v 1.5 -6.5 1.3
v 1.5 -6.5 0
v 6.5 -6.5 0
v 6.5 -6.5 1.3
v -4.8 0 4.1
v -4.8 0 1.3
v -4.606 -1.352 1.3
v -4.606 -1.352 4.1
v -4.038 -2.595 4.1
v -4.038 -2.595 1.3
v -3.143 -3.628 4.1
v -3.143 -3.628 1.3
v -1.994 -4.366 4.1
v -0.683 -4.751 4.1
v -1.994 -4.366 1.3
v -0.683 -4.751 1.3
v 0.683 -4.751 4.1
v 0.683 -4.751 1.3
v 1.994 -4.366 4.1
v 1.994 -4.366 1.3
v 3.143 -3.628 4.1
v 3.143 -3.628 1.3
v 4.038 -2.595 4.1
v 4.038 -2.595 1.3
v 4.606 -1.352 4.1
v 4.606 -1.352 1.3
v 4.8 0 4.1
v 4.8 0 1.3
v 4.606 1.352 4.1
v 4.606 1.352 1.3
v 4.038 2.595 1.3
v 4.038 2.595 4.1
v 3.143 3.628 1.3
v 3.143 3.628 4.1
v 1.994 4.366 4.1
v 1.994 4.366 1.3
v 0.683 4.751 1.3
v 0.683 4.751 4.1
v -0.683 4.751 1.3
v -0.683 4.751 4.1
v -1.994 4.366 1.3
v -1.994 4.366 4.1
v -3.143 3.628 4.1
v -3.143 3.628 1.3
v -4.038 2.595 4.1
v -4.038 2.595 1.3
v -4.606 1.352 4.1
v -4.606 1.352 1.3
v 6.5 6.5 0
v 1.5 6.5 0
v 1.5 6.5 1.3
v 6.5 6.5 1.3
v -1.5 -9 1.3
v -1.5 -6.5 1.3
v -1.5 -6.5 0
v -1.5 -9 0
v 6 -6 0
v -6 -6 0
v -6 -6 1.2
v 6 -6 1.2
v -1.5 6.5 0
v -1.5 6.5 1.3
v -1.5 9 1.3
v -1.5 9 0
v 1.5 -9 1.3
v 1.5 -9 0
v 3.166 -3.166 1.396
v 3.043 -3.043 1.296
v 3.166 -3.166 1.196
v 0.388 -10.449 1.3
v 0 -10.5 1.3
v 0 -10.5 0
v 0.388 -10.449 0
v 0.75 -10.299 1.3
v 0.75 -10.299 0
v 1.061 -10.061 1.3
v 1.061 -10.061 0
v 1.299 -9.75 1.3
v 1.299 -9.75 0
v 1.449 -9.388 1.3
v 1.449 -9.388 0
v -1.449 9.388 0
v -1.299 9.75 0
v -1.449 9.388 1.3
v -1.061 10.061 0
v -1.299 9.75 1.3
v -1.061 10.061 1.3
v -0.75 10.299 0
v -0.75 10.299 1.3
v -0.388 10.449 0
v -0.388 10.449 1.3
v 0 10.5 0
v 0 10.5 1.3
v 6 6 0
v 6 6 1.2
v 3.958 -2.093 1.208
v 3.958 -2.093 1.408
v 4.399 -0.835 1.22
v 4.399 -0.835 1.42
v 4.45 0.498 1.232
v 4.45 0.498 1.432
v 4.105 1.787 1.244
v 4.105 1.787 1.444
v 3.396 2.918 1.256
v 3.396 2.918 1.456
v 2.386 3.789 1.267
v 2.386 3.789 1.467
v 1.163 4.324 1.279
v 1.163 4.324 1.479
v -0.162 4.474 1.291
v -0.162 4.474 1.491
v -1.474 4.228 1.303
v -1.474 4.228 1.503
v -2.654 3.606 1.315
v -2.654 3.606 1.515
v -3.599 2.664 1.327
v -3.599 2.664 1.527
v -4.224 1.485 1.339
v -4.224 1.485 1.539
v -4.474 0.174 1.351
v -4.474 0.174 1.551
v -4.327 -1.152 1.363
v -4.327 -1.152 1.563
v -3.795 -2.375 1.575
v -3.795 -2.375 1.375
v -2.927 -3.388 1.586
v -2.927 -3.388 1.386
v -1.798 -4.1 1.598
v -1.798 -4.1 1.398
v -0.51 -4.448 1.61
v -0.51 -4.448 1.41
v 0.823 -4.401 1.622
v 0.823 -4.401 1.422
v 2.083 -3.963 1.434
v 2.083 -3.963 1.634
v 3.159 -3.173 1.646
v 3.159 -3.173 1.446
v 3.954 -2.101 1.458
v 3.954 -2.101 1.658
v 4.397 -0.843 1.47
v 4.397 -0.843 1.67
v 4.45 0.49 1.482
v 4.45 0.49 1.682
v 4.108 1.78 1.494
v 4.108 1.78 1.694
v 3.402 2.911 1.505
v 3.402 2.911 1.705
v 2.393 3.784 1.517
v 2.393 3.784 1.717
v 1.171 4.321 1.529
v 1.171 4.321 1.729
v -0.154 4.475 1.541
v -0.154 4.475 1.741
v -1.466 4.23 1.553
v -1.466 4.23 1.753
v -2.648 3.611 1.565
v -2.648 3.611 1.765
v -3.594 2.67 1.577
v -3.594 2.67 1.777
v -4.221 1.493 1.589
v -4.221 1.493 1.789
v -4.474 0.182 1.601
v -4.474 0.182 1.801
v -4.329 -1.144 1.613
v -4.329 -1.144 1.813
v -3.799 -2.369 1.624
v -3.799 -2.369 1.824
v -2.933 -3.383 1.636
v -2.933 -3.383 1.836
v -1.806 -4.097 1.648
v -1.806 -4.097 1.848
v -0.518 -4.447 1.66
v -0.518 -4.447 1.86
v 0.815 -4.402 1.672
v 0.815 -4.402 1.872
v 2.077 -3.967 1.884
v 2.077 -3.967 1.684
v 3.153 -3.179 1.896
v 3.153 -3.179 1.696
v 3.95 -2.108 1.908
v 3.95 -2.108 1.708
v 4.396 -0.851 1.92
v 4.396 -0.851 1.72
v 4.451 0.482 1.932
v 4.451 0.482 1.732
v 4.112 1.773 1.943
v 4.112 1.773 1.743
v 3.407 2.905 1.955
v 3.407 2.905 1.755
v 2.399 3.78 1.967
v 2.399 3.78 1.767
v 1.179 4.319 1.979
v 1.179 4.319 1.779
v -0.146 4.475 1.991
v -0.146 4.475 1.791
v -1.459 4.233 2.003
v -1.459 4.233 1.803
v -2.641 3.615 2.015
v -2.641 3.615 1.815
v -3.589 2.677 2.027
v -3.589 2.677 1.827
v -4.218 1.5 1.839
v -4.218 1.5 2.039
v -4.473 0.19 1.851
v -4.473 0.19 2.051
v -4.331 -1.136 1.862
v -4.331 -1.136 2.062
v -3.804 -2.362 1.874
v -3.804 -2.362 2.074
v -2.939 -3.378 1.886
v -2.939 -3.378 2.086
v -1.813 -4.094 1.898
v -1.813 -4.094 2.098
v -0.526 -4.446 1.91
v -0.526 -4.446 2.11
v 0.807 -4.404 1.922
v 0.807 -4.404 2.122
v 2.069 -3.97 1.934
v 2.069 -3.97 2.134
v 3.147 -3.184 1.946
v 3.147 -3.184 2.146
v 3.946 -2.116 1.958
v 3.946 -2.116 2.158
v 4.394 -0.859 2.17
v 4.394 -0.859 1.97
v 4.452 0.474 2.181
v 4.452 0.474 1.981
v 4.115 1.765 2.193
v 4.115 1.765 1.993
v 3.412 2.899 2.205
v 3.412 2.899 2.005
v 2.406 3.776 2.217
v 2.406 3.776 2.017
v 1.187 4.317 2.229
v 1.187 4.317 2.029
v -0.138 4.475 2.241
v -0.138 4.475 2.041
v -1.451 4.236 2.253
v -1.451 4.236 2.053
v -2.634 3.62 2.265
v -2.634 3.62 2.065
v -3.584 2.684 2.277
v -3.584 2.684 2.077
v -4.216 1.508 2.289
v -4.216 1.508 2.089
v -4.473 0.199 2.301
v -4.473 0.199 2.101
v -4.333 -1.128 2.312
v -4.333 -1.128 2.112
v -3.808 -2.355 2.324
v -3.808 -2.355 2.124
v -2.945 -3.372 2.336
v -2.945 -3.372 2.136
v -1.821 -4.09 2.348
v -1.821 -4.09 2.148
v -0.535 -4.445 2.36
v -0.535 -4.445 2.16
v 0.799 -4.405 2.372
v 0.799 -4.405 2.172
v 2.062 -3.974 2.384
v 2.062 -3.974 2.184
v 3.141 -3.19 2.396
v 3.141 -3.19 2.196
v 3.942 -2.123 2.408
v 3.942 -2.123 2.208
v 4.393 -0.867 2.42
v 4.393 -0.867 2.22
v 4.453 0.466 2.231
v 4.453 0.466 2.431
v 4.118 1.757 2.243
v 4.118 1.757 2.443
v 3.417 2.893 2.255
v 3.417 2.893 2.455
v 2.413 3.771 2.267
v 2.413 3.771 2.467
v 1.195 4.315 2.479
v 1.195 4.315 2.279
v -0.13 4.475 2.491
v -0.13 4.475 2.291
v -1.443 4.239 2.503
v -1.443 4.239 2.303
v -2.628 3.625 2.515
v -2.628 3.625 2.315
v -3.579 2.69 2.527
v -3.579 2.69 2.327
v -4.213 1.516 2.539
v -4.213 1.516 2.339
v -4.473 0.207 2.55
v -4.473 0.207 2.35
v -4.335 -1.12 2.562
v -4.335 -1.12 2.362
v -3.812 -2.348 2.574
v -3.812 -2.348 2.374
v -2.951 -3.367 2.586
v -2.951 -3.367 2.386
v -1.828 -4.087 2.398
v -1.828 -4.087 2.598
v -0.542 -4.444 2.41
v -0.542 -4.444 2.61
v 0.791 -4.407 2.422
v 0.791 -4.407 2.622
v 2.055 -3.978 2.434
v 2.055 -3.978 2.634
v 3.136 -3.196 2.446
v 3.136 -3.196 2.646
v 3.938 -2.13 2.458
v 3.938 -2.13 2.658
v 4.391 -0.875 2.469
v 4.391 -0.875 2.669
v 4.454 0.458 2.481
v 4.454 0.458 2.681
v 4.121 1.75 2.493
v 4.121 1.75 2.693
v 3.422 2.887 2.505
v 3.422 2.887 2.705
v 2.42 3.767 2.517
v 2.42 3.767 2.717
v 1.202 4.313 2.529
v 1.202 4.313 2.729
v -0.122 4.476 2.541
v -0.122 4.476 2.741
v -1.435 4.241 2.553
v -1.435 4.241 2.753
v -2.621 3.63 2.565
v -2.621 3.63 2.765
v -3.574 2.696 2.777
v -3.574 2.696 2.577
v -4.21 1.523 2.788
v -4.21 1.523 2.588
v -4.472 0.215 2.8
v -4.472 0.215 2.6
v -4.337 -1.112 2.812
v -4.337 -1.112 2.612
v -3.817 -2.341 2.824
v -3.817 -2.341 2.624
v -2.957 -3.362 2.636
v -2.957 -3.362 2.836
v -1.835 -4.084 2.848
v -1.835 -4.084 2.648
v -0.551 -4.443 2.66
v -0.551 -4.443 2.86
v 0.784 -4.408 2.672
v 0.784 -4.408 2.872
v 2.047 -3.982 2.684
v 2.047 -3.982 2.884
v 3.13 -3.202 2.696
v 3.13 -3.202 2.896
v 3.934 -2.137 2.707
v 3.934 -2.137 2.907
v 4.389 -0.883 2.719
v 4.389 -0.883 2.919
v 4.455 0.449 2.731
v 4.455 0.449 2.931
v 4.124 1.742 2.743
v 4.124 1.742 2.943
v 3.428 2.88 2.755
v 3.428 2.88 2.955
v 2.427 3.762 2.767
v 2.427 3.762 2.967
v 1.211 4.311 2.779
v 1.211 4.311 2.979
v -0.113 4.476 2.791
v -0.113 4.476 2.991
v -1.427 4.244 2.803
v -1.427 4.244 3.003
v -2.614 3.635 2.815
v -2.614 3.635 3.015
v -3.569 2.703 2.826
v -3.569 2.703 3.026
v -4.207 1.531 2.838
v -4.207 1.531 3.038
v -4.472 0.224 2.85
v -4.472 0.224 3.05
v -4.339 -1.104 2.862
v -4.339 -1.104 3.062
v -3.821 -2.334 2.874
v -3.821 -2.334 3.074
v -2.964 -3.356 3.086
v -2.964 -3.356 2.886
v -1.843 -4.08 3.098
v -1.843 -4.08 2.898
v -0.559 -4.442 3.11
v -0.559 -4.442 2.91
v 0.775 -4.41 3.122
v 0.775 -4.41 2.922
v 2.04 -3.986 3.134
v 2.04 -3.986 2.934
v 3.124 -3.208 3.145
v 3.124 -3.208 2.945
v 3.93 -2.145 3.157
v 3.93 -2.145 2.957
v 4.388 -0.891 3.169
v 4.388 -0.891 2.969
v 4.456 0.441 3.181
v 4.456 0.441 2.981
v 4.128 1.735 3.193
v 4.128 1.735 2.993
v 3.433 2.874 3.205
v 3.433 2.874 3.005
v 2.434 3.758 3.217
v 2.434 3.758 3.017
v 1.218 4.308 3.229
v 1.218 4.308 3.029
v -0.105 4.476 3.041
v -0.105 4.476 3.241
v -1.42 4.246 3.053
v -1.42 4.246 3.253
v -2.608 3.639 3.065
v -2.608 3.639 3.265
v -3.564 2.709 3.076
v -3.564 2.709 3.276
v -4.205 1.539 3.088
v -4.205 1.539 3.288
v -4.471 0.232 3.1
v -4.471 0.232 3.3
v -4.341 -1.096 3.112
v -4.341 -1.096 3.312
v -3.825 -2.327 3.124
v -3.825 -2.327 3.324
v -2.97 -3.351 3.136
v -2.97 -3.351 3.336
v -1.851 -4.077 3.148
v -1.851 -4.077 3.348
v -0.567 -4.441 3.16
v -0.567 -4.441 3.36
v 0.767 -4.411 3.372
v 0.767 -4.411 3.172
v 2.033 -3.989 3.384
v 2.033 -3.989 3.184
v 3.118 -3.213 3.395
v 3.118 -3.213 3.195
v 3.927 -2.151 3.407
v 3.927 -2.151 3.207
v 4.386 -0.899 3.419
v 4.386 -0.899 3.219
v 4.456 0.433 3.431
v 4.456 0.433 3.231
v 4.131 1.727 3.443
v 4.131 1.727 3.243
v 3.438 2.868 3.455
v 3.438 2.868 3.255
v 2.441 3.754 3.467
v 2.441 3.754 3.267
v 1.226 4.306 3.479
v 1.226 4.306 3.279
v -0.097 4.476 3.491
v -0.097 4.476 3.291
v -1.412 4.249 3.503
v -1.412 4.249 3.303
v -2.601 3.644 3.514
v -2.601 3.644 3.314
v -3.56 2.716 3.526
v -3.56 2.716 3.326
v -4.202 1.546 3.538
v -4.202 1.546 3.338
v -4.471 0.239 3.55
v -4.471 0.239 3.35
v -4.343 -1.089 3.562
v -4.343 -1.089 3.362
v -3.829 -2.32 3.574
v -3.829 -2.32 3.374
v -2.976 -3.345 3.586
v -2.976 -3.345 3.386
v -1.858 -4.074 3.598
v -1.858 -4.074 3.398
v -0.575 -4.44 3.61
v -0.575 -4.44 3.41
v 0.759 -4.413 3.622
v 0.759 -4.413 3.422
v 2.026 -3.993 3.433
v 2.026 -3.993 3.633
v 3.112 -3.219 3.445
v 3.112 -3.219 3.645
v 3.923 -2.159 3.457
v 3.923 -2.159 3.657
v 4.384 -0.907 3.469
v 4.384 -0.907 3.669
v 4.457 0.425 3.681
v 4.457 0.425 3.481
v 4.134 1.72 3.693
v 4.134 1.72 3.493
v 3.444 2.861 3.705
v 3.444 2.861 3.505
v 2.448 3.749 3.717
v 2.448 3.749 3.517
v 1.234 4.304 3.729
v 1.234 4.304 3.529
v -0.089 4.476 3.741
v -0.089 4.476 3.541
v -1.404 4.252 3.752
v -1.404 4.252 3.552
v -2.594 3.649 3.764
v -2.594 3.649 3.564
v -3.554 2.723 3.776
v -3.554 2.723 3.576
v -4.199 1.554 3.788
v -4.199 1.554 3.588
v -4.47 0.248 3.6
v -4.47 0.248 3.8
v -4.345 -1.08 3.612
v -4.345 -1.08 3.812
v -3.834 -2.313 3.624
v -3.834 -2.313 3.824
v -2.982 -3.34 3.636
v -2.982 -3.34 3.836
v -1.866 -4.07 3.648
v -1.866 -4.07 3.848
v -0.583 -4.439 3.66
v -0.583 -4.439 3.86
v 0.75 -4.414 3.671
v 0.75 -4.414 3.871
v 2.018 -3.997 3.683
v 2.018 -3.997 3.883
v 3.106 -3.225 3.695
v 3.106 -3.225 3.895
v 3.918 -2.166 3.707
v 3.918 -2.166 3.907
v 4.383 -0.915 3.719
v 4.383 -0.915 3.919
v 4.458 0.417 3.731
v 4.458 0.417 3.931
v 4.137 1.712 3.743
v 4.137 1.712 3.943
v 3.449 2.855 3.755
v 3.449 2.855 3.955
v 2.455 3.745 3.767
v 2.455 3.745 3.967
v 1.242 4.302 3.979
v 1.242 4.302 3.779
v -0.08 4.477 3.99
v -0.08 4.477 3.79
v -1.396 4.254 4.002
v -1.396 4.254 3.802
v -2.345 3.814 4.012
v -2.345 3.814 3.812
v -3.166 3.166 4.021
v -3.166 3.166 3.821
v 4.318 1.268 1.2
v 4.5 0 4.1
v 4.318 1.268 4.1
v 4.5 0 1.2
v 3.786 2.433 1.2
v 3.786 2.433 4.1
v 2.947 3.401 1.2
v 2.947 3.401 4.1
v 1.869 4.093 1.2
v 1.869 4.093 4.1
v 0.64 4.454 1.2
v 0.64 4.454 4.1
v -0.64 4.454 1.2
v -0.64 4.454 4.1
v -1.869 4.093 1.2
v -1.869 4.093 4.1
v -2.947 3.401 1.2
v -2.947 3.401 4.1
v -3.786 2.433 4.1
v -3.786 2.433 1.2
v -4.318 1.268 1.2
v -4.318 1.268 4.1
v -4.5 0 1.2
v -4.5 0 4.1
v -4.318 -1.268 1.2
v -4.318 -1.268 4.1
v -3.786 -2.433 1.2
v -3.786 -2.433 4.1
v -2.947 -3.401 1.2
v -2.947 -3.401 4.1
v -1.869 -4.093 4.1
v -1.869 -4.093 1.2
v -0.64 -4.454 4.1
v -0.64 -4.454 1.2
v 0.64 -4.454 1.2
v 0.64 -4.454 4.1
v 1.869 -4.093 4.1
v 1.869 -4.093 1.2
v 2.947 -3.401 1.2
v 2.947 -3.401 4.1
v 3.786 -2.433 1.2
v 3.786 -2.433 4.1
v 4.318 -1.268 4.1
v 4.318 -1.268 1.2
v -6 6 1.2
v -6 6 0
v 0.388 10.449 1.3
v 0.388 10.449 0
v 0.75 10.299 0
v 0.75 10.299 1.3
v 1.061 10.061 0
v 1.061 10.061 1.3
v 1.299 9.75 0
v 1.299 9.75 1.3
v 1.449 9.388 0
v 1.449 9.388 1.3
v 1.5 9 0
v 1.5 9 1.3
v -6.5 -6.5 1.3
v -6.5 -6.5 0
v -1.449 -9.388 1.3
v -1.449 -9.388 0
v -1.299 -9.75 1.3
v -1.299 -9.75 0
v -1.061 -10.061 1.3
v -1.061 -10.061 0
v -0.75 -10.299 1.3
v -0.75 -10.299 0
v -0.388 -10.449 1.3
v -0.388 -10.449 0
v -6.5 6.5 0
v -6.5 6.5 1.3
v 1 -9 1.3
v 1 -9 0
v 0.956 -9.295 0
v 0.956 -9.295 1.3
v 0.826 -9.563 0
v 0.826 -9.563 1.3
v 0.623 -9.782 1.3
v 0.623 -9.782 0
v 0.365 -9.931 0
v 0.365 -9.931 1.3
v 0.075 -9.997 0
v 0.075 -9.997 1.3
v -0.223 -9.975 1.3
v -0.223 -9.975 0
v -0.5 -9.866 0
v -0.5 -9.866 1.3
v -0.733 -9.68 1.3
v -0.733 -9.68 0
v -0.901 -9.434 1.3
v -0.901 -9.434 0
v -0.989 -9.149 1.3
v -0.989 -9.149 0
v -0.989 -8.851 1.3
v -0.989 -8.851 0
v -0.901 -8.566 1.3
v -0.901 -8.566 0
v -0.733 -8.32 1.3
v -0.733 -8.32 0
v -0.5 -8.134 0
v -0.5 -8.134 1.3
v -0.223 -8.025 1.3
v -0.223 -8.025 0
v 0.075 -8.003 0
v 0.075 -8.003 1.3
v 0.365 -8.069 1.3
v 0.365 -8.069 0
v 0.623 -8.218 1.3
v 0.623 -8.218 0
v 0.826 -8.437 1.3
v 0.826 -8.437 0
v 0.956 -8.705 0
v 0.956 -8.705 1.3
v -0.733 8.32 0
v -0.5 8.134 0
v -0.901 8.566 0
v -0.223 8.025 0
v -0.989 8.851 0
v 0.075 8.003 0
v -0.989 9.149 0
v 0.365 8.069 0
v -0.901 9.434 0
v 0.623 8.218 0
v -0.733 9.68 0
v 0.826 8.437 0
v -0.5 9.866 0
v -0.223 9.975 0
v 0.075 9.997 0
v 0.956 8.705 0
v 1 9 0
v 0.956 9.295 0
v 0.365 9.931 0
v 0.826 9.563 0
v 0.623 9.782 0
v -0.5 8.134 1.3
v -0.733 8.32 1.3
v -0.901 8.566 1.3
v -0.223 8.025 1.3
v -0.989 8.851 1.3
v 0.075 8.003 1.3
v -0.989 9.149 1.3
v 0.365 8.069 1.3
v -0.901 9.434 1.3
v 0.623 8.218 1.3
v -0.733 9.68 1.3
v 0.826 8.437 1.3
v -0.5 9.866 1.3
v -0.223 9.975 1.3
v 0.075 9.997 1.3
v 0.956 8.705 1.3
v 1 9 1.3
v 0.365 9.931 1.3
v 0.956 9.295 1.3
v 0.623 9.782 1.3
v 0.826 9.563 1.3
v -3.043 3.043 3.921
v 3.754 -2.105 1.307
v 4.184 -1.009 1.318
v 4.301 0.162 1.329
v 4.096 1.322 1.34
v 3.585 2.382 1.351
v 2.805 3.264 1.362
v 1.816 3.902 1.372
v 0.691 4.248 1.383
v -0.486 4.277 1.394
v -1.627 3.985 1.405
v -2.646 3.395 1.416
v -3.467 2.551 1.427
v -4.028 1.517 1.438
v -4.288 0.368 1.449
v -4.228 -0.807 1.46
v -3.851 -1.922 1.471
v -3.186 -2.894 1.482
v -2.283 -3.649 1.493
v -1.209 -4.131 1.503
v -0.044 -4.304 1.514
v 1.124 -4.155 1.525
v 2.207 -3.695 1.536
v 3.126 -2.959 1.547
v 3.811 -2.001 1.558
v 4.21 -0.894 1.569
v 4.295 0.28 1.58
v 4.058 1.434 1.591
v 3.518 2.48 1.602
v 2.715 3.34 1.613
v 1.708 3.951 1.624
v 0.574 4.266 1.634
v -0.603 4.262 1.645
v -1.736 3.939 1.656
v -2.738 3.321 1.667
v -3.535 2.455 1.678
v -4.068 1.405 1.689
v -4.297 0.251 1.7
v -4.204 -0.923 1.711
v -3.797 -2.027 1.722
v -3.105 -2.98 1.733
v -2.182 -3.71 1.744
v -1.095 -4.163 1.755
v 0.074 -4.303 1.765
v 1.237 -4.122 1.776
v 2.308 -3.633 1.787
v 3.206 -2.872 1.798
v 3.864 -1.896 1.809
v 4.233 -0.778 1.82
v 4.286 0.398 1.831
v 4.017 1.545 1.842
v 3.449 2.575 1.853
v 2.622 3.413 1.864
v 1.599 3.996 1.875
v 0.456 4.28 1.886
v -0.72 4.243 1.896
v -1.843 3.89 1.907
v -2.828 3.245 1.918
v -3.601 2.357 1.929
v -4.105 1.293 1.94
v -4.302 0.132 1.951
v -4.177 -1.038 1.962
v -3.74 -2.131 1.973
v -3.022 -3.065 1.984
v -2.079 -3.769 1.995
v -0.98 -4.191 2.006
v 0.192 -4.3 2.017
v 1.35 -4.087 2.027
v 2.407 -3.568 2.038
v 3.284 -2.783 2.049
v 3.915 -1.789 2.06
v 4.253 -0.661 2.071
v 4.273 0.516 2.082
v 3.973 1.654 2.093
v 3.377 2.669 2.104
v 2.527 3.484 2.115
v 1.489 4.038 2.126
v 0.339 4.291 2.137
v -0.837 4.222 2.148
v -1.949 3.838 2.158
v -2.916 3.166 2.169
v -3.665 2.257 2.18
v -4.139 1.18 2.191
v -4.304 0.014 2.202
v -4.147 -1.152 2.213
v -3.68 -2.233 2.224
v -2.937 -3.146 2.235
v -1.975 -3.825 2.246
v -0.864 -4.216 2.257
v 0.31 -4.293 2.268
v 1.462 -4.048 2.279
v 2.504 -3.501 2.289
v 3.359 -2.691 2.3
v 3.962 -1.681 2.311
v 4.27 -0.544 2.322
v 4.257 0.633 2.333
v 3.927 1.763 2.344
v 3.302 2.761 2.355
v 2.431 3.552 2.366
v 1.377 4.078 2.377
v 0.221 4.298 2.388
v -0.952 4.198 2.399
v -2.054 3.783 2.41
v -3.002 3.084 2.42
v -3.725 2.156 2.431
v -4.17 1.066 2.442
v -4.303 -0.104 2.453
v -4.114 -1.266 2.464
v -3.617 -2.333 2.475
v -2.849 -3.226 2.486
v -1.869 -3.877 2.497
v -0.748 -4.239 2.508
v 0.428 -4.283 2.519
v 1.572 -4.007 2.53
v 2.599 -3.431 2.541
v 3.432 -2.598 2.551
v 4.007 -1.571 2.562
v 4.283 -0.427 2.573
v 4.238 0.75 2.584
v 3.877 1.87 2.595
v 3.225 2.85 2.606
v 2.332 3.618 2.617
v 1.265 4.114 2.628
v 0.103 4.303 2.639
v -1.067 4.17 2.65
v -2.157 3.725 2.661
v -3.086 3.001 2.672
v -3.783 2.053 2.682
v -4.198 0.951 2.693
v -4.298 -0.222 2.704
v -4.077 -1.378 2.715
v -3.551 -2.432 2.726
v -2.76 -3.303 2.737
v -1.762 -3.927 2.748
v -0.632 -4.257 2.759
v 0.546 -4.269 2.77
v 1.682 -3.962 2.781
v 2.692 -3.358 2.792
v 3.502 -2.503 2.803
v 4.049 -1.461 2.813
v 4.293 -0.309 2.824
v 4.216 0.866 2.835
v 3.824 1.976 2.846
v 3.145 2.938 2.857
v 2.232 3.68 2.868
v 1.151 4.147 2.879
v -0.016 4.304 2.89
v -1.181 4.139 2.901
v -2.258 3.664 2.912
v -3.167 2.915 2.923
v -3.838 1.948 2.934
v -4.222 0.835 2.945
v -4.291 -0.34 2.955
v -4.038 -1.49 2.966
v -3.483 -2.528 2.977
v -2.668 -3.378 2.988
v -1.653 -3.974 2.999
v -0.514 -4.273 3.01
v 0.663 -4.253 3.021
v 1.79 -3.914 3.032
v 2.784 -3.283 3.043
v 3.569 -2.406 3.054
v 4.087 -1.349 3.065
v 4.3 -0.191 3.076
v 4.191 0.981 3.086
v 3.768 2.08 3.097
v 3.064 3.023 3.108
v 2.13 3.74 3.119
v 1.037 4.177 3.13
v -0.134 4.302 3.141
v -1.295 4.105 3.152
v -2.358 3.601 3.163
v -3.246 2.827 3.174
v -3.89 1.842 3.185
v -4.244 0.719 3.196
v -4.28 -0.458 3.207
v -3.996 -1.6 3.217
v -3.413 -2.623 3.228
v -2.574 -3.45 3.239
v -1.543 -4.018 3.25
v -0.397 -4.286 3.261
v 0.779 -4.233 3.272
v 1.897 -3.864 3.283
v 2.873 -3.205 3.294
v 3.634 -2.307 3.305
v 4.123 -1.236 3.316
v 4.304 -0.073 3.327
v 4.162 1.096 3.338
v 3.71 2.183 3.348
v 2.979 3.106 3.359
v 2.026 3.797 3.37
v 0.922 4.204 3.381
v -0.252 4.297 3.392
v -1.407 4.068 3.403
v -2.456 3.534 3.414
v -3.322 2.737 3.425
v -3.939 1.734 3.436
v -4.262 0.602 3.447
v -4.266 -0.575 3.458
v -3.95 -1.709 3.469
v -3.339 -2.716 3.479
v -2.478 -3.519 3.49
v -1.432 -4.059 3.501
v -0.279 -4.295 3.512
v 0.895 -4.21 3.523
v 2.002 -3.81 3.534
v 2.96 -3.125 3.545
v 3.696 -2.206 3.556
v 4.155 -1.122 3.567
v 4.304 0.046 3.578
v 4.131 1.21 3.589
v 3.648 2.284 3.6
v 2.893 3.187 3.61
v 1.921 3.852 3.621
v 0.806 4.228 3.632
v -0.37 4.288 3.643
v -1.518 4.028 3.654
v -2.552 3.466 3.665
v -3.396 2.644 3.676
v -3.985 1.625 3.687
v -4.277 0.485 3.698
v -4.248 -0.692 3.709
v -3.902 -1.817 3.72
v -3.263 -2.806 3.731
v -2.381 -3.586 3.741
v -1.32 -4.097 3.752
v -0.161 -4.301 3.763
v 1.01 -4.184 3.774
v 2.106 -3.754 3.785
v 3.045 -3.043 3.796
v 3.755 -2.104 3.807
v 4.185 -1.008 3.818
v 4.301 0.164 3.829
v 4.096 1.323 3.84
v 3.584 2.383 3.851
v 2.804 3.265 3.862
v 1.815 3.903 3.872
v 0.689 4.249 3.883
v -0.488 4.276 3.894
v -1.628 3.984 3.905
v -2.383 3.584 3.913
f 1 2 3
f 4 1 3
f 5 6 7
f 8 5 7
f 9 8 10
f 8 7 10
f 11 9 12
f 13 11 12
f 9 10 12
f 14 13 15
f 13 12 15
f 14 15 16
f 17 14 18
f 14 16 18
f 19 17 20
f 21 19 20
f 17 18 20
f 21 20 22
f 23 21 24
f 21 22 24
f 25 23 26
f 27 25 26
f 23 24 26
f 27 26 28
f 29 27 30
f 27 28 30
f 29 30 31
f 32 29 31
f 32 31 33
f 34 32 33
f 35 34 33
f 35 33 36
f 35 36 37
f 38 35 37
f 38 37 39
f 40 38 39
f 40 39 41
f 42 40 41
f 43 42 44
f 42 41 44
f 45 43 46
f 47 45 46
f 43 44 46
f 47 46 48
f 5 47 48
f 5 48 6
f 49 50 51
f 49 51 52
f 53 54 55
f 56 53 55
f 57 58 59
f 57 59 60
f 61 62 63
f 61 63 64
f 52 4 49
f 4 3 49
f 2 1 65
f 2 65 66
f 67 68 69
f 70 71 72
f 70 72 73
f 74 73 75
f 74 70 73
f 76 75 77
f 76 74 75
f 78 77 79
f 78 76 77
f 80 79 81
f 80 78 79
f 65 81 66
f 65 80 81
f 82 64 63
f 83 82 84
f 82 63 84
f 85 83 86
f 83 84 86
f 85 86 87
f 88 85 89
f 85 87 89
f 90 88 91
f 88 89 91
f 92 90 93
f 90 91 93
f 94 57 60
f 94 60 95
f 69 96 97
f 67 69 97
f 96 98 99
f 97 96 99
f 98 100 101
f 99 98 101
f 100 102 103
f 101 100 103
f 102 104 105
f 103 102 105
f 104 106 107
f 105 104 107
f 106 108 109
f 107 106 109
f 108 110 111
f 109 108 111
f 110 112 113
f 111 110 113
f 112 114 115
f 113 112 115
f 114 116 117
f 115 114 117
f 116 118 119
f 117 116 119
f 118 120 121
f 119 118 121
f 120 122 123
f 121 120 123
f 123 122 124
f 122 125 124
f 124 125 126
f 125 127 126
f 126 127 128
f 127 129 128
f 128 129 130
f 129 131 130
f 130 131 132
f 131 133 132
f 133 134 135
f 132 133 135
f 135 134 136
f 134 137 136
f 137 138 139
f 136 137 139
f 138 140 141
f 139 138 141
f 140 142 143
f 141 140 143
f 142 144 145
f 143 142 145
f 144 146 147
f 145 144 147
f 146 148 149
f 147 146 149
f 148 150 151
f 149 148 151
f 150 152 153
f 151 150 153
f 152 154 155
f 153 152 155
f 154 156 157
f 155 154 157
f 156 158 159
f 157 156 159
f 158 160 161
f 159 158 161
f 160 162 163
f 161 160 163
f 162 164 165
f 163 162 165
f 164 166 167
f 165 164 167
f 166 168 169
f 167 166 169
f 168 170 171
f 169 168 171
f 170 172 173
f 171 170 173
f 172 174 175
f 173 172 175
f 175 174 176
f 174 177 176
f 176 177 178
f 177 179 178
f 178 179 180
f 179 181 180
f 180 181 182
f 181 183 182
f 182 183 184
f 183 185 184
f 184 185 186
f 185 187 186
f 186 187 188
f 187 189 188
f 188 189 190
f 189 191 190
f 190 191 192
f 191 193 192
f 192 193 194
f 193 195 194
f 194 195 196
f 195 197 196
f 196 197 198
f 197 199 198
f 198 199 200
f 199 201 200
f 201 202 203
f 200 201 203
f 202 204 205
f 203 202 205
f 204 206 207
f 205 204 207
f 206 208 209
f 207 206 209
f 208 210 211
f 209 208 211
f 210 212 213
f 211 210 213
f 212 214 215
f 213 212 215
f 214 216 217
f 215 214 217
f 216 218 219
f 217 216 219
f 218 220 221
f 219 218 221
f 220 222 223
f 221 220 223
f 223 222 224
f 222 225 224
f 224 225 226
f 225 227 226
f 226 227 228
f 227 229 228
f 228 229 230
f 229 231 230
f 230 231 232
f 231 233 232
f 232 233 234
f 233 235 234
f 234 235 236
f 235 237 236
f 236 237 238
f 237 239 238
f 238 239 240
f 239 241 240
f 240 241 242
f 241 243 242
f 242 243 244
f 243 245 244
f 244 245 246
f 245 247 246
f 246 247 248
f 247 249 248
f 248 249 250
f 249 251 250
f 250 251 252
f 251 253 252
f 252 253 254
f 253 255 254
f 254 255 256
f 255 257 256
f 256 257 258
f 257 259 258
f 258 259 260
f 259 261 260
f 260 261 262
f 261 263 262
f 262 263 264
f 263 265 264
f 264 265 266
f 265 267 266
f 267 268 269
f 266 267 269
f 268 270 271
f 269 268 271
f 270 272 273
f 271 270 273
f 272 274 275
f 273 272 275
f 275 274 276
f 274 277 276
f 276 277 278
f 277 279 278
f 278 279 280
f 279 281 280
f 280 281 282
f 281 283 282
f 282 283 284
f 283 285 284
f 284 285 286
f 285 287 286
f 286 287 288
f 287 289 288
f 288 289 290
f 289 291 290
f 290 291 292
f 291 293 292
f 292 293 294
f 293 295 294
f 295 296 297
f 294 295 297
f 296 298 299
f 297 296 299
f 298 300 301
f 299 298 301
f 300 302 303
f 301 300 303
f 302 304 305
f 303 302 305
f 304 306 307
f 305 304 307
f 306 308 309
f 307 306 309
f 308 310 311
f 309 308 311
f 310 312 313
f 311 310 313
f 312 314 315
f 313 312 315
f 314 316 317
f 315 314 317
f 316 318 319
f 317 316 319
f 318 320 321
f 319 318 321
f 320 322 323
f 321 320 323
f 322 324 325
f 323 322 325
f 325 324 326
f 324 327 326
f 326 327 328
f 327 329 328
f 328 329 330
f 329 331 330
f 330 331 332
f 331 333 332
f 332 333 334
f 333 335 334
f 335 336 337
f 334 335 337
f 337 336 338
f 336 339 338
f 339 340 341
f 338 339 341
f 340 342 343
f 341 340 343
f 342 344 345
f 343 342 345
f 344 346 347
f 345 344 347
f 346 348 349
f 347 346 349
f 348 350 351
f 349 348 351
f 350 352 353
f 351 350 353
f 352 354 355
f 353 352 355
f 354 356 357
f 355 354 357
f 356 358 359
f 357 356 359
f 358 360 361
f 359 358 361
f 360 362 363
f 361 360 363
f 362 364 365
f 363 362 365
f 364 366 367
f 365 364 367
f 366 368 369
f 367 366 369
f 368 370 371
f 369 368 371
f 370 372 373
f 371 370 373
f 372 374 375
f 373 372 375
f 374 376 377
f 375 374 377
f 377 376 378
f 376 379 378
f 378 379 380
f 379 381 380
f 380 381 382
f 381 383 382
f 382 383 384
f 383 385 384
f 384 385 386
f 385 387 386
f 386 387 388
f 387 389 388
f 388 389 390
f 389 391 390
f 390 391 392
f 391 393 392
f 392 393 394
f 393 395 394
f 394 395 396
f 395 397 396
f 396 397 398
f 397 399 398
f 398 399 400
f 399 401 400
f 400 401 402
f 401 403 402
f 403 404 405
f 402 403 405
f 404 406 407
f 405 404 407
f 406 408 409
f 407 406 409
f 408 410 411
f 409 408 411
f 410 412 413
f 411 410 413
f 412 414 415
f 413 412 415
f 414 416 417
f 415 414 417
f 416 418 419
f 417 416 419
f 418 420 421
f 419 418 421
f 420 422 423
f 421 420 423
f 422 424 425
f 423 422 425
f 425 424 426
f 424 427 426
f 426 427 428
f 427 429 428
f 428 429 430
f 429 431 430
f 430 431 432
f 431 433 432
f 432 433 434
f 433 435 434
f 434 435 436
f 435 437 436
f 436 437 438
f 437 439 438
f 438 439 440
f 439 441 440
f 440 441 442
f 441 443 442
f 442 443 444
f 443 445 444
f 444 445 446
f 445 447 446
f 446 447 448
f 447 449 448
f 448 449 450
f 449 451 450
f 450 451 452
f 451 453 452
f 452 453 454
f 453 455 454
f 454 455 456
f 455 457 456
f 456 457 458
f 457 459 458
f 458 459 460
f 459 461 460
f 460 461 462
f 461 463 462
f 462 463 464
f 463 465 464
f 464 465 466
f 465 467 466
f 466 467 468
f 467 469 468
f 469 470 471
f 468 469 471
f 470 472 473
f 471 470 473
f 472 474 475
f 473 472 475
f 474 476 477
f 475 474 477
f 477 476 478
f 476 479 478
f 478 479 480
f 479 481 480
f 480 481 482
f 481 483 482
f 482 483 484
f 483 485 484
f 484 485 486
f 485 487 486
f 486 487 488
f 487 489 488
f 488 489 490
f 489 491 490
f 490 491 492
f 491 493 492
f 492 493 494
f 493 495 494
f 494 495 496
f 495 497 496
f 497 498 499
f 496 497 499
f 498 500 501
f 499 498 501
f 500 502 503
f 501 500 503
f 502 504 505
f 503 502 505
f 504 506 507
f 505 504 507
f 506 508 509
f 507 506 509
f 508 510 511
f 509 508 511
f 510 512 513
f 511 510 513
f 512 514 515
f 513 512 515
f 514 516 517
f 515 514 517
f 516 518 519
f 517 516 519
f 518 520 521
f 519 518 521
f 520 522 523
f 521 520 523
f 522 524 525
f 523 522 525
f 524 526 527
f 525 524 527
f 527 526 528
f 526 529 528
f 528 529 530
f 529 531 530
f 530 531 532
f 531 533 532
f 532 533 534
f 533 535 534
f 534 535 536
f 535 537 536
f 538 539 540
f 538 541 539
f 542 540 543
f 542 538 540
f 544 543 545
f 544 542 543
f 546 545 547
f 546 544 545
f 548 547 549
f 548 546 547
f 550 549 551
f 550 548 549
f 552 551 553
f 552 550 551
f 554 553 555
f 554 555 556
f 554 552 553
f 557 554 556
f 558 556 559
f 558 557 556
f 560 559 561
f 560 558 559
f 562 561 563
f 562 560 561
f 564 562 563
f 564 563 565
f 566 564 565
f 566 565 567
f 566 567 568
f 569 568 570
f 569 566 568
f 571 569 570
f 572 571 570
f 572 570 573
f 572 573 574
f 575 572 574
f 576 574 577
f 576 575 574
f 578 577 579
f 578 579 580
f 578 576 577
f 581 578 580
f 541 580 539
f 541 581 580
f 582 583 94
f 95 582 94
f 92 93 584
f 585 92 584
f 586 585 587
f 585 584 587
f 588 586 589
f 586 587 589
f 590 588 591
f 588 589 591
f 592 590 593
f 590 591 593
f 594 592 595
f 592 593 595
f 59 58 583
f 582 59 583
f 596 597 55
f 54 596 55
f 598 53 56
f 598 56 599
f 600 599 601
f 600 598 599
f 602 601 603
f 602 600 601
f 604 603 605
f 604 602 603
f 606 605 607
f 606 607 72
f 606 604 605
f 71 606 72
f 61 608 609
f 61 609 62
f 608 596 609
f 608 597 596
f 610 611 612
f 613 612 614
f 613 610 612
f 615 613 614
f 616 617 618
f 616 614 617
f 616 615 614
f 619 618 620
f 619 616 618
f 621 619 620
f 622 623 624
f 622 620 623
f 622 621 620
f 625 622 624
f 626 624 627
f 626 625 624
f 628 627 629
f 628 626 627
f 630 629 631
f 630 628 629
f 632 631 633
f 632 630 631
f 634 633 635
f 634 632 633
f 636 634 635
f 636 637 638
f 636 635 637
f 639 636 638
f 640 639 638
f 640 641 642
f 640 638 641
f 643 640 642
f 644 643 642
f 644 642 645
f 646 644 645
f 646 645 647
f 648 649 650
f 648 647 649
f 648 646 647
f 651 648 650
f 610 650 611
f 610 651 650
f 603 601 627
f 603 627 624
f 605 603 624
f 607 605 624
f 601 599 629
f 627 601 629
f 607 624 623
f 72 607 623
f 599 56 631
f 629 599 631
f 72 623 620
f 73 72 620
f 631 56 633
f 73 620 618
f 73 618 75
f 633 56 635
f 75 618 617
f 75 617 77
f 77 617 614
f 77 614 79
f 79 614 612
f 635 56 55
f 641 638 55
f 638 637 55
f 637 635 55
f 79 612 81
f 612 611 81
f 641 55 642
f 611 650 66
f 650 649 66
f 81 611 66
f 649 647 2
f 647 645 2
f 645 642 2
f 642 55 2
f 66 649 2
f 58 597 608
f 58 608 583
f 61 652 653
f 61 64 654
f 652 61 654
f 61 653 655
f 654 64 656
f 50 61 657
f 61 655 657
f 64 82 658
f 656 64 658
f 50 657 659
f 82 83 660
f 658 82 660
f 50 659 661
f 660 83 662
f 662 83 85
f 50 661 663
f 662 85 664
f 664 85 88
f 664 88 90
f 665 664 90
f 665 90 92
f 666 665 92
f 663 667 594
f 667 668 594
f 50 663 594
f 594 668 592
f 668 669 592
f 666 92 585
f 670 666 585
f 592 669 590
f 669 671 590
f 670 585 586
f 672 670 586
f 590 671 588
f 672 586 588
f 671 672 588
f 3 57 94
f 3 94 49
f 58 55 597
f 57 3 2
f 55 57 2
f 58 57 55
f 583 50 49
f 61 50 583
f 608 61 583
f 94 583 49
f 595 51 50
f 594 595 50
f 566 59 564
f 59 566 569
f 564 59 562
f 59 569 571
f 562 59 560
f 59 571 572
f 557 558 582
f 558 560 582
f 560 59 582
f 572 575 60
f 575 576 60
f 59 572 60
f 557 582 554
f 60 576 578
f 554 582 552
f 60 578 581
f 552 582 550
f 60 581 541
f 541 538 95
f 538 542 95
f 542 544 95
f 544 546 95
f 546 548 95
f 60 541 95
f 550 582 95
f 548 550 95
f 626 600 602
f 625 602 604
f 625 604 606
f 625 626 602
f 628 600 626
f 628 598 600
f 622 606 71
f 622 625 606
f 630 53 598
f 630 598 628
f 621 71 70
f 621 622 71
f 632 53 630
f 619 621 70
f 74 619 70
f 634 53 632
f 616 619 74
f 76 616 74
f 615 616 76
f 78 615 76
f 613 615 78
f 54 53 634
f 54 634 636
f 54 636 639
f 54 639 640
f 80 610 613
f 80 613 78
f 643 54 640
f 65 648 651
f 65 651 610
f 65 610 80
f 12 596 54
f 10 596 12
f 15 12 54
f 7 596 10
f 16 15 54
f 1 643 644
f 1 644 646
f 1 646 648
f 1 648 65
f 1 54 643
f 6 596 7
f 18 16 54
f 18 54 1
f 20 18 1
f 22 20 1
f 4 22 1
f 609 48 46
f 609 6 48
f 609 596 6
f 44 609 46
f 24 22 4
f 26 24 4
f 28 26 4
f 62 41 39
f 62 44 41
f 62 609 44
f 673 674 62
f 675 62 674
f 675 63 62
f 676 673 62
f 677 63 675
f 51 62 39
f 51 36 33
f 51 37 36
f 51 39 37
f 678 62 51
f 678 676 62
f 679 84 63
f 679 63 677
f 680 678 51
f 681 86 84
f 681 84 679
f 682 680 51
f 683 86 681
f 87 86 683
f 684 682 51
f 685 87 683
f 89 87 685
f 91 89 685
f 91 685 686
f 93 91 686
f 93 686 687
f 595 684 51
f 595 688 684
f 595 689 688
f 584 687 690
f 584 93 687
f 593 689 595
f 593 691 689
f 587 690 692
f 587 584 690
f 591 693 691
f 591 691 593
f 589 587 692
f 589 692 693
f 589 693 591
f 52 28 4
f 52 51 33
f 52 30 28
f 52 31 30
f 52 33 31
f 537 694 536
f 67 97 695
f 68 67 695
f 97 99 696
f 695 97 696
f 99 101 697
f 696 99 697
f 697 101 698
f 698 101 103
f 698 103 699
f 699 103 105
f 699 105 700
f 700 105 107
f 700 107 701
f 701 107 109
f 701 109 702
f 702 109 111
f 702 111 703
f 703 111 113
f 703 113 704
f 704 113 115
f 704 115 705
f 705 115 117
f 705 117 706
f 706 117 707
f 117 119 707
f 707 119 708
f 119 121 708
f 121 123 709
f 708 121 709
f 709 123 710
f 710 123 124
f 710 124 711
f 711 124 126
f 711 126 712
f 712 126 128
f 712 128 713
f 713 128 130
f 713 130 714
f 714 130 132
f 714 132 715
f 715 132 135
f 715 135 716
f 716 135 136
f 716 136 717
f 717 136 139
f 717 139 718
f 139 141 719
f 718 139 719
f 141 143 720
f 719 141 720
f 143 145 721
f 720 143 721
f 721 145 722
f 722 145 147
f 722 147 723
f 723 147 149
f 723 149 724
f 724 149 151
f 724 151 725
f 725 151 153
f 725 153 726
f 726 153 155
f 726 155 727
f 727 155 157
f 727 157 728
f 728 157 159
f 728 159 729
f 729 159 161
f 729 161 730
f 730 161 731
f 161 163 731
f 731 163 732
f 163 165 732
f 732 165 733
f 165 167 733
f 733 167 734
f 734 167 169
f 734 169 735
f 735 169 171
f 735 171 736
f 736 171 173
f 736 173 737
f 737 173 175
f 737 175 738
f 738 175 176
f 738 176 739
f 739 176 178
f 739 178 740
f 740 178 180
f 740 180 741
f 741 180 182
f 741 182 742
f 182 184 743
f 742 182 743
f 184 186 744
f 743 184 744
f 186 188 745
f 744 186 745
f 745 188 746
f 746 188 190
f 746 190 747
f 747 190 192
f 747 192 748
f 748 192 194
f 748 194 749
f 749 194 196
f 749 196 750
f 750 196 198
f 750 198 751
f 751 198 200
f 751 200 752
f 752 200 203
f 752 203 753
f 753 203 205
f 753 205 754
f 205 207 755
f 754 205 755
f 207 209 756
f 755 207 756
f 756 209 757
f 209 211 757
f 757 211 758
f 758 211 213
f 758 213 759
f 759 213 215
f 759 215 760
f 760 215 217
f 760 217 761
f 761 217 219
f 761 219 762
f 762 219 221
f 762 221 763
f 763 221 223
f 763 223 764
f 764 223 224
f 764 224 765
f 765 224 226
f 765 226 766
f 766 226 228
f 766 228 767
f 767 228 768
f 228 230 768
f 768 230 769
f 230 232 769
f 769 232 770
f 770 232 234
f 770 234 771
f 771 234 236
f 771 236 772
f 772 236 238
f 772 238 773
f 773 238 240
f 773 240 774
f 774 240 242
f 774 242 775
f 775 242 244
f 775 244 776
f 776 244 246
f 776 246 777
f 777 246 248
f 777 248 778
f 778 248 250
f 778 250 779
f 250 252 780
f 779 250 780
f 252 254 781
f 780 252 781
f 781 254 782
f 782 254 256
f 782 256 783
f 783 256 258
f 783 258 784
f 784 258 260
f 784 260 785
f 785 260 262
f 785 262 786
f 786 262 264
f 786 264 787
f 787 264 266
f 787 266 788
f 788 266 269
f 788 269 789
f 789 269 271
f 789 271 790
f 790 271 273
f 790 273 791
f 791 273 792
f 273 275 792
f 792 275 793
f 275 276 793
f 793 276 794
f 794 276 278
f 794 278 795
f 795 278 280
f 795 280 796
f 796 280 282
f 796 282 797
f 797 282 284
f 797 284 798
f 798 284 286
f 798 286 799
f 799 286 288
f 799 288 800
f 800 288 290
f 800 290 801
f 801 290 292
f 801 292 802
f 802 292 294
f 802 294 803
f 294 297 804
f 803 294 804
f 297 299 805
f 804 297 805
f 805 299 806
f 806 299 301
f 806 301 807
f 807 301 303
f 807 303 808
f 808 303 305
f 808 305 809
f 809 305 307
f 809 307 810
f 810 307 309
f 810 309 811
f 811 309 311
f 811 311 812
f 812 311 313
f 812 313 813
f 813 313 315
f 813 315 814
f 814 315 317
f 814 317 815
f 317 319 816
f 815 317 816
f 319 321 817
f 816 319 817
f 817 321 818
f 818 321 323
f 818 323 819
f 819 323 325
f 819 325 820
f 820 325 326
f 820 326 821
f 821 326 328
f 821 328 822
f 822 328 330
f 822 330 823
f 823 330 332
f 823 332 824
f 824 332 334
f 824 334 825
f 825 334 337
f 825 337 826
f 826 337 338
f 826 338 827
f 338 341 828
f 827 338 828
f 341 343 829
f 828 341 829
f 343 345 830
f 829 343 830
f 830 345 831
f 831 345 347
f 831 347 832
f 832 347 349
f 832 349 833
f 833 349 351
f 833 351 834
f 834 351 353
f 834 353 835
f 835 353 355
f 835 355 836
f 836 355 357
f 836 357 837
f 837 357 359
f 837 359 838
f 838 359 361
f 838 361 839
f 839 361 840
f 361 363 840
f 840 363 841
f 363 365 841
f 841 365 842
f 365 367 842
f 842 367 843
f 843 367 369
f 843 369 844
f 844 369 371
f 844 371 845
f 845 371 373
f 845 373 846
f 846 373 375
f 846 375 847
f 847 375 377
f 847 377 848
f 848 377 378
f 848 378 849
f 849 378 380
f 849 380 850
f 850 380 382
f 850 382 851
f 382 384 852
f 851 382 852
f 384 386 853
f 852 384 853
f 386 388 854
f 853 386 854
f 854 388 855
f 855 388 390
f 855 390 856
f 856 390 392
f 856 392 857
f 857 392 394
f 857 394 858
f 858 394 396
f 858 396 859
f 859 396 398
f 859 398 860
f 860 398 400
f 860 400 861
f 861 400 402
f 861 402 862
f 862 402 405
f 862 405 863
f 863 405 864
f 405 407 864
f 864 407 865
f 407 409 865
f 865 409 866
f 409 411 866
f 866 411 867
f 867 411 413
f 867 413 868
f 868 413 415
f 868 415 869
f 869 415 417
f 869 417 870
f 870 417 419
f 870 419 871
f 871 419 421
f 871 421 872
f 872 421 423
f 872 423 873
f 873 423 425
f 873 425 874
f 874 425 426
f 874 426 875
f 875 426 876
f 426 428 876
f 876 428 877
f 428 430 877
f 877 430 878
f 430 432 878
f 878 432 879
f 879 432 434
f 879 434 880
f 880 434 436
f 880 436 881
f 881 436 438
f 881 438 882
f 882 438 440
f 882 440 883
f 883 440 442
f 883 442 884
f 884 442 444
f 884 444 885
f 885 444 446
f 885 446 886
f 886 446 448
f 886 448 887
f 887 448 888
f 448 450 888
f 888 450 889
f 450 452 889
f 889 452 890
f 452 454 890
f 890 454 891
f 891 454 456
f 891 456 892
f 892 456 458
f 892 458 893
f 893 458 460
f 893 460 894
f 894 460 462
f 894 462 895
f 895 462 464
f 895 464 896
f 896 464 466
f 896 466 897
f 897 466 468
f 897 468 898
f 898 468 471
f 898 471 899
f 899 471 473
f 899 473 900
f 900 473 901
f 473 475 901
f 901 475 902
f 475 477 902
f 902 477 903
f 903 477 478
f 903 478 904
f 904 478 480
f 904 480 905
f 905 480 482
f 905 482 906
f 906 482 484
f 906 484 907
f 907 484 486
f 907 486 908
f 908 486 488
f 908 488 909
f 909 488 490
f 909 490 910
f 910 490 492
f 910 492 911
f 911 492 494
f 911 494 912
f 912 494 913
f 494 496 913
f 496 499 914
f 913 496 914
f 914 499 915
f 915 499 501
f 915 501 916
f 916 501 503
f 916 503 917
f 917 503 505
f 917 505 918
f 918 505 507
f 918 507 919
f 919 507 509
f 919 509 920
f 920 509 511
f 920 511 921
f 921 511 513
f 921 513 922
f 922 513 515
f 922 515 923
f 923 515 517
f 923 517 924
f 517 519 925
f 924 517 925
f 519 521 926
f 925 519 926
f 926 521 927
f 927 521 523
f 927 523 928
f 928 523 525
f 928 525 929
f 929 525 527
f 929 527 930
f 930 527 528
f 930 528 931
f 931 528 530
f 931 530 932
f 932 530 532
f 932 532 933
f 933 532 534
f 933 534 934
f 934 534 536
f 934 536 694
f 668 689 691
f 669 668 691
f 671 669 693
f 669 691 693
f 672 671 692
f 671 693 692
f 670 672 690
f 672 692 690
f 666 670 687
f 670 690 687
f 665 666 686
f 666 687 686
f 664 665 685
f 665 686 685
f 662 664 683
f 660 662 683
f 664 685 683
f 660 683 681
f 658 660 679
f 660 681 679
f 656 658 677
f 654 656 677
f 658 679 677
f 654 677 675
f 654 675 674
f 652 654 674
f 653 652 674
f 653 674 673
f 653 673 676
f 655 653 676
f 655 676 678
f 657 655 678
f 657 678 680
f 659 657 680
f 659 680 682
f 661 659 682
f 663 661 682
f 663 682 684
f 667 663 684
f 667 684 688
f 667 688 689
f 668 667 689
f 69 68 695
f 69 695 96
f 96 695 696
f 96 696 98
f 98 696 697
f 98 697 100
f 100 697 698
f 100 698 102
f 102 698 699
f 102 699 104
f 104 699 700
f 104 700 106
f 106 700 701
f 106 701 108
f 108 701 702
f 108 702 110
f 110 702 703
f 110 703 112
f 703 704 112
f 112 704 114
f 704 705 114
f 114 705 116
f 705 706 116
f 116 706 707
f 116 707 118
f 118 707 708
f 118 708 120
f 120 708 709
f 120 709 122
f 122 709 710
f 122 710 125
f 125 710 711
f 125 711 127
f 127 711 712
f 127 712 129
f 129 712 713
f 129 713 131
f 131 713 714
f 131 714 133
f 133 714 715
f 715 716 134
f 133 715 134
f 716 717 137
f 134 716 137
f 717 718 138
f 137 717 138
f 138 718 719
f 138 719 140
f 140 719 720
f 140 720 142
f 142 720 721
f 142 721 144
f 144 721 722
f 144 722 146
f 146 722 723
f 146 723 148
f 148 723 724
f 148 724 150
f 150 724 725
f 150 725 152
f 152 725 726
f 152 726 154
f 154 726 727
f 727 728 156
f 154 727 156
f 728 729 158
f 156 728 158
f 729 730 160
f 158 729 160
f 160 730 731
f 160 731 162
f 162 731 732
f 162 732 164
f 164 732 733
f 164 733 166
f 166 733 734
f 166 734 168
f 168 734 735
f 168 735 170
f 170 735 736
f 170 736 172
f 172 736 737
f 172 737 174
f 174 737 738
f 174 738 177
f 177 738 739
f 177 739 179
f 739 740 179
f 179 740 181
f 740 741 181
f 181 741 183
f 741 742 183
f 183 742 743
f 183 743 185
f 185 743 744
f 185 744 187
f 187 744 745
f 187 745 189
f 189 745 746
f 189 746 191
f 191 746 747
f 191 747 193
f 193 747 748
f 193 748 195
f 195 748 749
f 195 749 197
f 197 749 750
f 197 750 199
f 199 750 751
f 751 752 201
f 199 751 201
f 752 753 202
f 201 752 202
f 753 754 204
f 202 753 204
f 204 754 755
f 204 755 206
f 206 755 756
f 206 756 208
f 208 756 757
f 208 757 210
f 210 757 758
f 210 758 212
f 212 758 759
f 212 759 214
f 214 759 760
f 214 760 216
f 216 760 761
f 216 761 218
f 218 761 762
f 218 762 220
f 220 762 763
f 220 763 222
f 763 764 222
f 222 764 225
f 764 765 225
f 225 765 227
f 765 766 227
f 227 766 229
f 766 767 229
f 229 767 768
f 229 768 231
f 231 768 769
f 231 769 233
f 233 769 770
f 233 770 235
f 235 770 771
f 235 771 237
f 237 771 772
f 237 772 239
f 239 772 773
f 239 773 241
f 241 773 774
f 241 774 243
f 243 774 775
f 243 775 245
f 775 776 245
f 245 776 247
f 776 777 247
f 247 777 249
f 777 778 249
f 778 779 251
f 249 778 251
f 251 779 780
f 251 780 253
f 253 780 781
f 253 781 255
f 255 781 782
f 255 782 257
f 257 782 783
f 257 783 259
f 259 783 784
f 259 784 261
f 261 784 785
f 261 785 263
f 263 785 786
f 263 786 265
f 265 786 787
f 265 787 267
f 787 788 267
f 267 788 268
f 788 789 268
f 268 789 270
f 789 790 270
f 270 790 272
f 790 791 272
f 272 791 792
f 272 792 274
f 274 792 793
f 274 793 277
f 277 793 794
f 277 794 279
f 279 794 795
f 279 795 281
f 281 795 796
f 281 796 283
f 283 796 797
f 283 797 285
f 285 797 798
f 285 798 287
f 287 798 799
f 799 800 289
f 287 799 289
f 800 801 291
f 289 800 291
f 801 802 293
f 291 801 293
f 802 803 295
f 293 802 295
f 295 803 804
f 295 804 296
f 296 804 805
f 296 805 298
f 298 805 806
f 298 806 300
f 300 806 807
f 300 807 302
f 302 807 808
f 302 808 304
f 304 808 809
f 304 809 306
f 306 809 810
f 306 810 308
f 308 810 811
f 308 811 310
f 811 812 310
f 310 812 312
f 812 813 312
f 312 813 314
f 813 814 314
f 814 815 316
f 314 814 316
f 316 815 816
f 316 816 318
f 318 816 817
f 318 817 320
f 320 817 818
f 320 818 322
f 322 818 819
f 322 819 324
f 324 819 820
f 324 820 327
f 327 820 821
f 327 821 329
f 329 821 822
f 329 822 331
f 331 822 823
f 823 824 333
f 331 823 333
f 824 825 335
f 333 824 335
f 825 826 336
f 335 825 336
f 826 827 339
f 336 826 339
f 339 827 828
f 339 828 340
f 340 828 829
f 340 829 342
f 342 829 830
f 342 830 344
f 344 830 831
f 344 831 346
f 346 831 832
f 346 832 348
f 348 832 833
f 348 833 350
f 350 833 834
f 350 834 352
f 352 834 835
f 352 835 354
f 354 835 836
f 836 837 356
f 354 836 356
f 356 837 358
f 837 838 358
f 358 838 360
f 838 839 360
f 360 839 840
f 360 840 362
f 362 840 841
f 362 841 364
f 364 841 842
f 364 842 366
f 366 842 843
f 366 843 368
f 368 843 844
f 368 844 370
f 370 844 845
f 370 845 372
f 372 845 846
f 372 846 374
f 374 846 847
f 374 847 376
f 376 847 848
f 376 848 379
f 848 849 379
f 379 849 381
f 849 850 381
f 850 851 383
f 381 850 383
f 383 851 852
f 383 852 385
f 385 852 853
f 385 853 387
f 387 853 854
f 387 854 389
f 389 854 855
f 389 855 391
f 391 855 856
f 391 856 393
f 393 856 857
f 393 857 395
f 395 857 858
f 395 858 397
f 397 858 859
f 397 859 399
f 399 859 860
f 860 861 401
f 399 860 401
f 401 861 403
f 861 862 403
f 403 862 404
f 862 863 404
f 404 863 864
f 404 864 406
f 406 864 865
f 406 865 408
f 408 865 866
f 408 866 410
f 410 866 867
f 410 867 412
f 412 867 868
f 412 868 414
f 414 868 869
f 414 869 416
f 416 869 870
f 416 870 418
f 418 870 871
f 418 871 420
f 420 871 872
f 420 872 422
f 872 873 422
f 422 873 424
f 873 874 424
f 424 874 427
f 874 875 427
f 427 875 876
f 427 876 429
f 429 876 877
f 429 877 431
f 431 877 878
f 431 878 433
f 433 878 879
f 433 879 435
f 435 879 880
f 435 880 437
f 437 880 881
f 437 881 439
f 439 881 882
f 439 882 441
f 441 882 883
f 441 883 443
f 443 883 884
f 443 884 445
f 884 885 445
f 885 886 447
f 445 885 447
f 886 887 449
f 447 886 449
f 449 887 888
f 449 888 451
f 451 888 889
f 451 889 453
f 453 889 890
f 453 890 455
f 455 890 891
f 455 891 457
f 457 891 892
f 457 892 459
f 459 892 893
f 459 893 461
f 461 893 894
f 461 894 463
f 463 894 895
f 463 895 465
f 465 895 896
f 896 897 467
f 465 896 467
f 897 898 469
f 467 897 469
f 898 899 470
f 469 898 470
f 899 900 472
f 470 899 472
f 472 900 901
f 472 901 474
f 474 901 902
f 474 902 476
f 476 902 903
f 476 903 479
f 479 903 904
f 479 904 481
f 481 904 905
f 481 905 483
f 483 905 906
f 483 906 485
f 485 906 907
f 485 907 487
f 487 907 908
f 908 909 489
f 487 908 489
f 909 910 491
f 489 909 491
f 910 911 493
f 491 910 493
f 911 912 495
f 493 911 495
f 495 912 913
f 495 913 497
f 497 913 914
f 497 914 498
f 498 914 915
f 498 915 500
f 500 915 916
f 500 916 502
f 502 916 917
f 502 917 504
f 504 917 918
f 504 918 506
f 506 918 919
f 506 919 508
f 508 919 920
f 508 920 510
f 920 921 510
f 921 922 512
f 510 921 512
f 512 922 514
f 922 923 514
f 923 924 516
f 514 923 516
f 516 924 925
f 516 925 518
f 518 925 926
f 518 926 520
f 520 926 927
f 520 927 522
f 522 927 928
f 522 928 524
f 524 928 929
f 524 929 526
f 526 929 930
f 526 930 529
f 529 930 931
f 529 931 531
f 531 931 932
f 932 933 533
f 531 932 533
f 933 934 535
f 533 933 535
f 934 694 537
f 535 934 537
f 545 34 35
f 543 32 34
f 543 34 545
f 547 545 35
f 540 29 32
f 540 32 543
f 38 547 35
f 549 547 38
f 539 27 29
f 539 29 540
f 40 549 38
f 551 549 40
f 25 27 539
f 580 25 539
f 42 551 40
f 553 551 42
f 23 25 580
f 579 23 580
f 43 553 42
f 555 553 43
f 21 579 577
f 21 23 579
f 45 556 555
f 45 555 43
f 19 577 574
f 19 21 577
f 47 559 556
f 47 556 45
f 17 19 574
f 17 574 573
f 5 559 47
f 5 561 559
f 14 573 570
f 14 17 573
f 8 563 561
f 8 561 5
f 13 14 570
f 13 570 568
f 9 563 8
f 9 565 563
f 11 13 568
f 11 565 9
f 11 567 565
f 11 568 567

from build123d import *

# Parameters (mm, degrees)
SKETCH_1_W          = 13
SKETCH_1_H          = 13
SKETCH_1_W_2        = 12
SKETCH_1_H_2        = 12
EXTRUDE_1_DEPTH     = 1.2
SKETCH_2_W          = 13
SKETCH_2_H          = 13
SKETCH_2_R          = 4.5
EXTRUDE_2_DEPTH     = 0.1
SKETCH_3_W          = 3
SKETCH_3_H          = 1.3
EXTRUDE_3_DEPTH     = 4
CUT_EXTRUDE_1_DEPTH = 4
SKETCH_5_R          = 1
CUT_EXTRUDE_2_DEPTH = 4
SKETCH_6_R          = 4.8
SKETCH_6_R_2        = 4.5
EXTRUDE_4_DEPTH     = 2.8
SWEEP_1_PITCH       = 0.25
SWEEP_1_HEIGHT      = 2.625
SWEEP_1_RADIUS      = 4.5
SWEEP_1_START_ANGLE = -45


with BuildPart() as part:
    # 草图1 → 凸台-拉伸1 (new body)
    with BuildSketch(Plane.XY):
        Rectangle(SKETCH_1_W, SKETCH_1_H)
        Rectangle(SKETCH_1_W_2, SKETCH_1_H_2, mode=Mode.SUBTRACT)
    extrude(amount=EXTRUDE_1_DEPTH)

    # 草图2 → 凸台-拉伸2 (add)
    with BuildSketch(Plane.XY.offset(1.2)):
        Rectangle(SKETCH_2_W, SKETCH_2_H)
        Circle(SKETCH_2_R, mode=Mode.SUBTRACT)
    extrude(amount=EXTRUDE_2_DEPTH)

    # 草图3 → 凸台-拉伸3 (add)
    with BuildSketch(Plane(origin=(0, 6.5, 0), x_dir=(1, 0, 0), z_dir=(0, 1, 0))):
        with Locations((0, -0.65)):
            Rectangle(SKETCH_3_W, SKETCH_3_H)
    extrude_3 = extrude(amount=EXTRUDE_3_DEPTH)

    # 草图4 → 切除-拉伸1 (cut)
    with BuildSketch(Plane.XY.offset(1.3)):
        with BuildLine():
            Line((-1.5, 10.5), (-1.5, 9))
            ThreePointArc((-1.5, 9), (-1.060660172, 10.060660172), (0, 10.5))
            Line((0, 10.5), (-1.5, 10.5))
        make_face()
        with BuildLine():
            ThreePointArc((0, 10.5), (1.060660172, 10.060660172), (1.5, 9))
            Line((1.5, 9), (1.5, 10.5))
            Line((1.5, 10.5), (0, 10.5))
        make_face()
    cut_extrude_1 = extrude(amount=-CUT_EXTRUDE_1_DEPTH, mode=Mode.SUBTRACT)

    # 草图5 → 切除-拉伸2 (cut)
    with BuildSketch(Plane.XY.offset(1.3)):
        with Locations((0, 9)):
            Circle(SKETCH_5_R)
    cut_extrude_2 = extrude(amount=-CUT_EXTRUDE_2_DEPTH, mode=Mode.SUBTRACT)

    # 镜向1: 凸台-拉伸3, 切除-拉伸1, 切除-拉伸2 across plane
    add(extrude_3.mirror(Plane.ZX))
    add(cut_extrude_1.mirror(Plane.ZX), mode=Mode.SUBTRACT)
    add(cut_extrude_2.mirror(Plane.ZX), mode=Mode.SUBTRACT)

    # 草图6 → 凸台-拉伸4 (add)
    with BuildSketch(Plane.XY.offset(1.3)):
        with Locations(Location((0, 0, 0), (0, 0, 180))):
            Circle(SKETCH_6_R)
        Circle(SKETCH_6_R_2, mode=Mode.SUBTRACT)
    extrude(amount=EXTRUDE_4_DEPTH)


with BuildPart() as body_2:
    # 扫描1: sweep along a helix
    with BuildLine() as sweep_1_path:
        add(Helix(SWEEP_1_PITCH, SWEEP_1_HEIGHT, SWEEP_1_RADIUS, center=(0, 0, 1.2), direction=(0, 0, 1), mode=Mode.PRIVATE).rotate(Axis((0, 0, 1.2), (0, 0, 1)), SWEEP_1_START_ANGLE))
    # 草图8 → 扫描1 (sweep)
    with BuildSketch(Plane(origin=(0, 0, 0), x_dir=(1, 0, 0), z_dir=(0, 1, 0))):
        Polygon((-4.477344788, -1.602270081), (-4.477344788, -1.802270081), (-4.304139707, -1.702270081), align=None)
    sweep(path=sweep_1_path.line, is_frenet=True)


solid = Compound([part.part, body_2.part])
